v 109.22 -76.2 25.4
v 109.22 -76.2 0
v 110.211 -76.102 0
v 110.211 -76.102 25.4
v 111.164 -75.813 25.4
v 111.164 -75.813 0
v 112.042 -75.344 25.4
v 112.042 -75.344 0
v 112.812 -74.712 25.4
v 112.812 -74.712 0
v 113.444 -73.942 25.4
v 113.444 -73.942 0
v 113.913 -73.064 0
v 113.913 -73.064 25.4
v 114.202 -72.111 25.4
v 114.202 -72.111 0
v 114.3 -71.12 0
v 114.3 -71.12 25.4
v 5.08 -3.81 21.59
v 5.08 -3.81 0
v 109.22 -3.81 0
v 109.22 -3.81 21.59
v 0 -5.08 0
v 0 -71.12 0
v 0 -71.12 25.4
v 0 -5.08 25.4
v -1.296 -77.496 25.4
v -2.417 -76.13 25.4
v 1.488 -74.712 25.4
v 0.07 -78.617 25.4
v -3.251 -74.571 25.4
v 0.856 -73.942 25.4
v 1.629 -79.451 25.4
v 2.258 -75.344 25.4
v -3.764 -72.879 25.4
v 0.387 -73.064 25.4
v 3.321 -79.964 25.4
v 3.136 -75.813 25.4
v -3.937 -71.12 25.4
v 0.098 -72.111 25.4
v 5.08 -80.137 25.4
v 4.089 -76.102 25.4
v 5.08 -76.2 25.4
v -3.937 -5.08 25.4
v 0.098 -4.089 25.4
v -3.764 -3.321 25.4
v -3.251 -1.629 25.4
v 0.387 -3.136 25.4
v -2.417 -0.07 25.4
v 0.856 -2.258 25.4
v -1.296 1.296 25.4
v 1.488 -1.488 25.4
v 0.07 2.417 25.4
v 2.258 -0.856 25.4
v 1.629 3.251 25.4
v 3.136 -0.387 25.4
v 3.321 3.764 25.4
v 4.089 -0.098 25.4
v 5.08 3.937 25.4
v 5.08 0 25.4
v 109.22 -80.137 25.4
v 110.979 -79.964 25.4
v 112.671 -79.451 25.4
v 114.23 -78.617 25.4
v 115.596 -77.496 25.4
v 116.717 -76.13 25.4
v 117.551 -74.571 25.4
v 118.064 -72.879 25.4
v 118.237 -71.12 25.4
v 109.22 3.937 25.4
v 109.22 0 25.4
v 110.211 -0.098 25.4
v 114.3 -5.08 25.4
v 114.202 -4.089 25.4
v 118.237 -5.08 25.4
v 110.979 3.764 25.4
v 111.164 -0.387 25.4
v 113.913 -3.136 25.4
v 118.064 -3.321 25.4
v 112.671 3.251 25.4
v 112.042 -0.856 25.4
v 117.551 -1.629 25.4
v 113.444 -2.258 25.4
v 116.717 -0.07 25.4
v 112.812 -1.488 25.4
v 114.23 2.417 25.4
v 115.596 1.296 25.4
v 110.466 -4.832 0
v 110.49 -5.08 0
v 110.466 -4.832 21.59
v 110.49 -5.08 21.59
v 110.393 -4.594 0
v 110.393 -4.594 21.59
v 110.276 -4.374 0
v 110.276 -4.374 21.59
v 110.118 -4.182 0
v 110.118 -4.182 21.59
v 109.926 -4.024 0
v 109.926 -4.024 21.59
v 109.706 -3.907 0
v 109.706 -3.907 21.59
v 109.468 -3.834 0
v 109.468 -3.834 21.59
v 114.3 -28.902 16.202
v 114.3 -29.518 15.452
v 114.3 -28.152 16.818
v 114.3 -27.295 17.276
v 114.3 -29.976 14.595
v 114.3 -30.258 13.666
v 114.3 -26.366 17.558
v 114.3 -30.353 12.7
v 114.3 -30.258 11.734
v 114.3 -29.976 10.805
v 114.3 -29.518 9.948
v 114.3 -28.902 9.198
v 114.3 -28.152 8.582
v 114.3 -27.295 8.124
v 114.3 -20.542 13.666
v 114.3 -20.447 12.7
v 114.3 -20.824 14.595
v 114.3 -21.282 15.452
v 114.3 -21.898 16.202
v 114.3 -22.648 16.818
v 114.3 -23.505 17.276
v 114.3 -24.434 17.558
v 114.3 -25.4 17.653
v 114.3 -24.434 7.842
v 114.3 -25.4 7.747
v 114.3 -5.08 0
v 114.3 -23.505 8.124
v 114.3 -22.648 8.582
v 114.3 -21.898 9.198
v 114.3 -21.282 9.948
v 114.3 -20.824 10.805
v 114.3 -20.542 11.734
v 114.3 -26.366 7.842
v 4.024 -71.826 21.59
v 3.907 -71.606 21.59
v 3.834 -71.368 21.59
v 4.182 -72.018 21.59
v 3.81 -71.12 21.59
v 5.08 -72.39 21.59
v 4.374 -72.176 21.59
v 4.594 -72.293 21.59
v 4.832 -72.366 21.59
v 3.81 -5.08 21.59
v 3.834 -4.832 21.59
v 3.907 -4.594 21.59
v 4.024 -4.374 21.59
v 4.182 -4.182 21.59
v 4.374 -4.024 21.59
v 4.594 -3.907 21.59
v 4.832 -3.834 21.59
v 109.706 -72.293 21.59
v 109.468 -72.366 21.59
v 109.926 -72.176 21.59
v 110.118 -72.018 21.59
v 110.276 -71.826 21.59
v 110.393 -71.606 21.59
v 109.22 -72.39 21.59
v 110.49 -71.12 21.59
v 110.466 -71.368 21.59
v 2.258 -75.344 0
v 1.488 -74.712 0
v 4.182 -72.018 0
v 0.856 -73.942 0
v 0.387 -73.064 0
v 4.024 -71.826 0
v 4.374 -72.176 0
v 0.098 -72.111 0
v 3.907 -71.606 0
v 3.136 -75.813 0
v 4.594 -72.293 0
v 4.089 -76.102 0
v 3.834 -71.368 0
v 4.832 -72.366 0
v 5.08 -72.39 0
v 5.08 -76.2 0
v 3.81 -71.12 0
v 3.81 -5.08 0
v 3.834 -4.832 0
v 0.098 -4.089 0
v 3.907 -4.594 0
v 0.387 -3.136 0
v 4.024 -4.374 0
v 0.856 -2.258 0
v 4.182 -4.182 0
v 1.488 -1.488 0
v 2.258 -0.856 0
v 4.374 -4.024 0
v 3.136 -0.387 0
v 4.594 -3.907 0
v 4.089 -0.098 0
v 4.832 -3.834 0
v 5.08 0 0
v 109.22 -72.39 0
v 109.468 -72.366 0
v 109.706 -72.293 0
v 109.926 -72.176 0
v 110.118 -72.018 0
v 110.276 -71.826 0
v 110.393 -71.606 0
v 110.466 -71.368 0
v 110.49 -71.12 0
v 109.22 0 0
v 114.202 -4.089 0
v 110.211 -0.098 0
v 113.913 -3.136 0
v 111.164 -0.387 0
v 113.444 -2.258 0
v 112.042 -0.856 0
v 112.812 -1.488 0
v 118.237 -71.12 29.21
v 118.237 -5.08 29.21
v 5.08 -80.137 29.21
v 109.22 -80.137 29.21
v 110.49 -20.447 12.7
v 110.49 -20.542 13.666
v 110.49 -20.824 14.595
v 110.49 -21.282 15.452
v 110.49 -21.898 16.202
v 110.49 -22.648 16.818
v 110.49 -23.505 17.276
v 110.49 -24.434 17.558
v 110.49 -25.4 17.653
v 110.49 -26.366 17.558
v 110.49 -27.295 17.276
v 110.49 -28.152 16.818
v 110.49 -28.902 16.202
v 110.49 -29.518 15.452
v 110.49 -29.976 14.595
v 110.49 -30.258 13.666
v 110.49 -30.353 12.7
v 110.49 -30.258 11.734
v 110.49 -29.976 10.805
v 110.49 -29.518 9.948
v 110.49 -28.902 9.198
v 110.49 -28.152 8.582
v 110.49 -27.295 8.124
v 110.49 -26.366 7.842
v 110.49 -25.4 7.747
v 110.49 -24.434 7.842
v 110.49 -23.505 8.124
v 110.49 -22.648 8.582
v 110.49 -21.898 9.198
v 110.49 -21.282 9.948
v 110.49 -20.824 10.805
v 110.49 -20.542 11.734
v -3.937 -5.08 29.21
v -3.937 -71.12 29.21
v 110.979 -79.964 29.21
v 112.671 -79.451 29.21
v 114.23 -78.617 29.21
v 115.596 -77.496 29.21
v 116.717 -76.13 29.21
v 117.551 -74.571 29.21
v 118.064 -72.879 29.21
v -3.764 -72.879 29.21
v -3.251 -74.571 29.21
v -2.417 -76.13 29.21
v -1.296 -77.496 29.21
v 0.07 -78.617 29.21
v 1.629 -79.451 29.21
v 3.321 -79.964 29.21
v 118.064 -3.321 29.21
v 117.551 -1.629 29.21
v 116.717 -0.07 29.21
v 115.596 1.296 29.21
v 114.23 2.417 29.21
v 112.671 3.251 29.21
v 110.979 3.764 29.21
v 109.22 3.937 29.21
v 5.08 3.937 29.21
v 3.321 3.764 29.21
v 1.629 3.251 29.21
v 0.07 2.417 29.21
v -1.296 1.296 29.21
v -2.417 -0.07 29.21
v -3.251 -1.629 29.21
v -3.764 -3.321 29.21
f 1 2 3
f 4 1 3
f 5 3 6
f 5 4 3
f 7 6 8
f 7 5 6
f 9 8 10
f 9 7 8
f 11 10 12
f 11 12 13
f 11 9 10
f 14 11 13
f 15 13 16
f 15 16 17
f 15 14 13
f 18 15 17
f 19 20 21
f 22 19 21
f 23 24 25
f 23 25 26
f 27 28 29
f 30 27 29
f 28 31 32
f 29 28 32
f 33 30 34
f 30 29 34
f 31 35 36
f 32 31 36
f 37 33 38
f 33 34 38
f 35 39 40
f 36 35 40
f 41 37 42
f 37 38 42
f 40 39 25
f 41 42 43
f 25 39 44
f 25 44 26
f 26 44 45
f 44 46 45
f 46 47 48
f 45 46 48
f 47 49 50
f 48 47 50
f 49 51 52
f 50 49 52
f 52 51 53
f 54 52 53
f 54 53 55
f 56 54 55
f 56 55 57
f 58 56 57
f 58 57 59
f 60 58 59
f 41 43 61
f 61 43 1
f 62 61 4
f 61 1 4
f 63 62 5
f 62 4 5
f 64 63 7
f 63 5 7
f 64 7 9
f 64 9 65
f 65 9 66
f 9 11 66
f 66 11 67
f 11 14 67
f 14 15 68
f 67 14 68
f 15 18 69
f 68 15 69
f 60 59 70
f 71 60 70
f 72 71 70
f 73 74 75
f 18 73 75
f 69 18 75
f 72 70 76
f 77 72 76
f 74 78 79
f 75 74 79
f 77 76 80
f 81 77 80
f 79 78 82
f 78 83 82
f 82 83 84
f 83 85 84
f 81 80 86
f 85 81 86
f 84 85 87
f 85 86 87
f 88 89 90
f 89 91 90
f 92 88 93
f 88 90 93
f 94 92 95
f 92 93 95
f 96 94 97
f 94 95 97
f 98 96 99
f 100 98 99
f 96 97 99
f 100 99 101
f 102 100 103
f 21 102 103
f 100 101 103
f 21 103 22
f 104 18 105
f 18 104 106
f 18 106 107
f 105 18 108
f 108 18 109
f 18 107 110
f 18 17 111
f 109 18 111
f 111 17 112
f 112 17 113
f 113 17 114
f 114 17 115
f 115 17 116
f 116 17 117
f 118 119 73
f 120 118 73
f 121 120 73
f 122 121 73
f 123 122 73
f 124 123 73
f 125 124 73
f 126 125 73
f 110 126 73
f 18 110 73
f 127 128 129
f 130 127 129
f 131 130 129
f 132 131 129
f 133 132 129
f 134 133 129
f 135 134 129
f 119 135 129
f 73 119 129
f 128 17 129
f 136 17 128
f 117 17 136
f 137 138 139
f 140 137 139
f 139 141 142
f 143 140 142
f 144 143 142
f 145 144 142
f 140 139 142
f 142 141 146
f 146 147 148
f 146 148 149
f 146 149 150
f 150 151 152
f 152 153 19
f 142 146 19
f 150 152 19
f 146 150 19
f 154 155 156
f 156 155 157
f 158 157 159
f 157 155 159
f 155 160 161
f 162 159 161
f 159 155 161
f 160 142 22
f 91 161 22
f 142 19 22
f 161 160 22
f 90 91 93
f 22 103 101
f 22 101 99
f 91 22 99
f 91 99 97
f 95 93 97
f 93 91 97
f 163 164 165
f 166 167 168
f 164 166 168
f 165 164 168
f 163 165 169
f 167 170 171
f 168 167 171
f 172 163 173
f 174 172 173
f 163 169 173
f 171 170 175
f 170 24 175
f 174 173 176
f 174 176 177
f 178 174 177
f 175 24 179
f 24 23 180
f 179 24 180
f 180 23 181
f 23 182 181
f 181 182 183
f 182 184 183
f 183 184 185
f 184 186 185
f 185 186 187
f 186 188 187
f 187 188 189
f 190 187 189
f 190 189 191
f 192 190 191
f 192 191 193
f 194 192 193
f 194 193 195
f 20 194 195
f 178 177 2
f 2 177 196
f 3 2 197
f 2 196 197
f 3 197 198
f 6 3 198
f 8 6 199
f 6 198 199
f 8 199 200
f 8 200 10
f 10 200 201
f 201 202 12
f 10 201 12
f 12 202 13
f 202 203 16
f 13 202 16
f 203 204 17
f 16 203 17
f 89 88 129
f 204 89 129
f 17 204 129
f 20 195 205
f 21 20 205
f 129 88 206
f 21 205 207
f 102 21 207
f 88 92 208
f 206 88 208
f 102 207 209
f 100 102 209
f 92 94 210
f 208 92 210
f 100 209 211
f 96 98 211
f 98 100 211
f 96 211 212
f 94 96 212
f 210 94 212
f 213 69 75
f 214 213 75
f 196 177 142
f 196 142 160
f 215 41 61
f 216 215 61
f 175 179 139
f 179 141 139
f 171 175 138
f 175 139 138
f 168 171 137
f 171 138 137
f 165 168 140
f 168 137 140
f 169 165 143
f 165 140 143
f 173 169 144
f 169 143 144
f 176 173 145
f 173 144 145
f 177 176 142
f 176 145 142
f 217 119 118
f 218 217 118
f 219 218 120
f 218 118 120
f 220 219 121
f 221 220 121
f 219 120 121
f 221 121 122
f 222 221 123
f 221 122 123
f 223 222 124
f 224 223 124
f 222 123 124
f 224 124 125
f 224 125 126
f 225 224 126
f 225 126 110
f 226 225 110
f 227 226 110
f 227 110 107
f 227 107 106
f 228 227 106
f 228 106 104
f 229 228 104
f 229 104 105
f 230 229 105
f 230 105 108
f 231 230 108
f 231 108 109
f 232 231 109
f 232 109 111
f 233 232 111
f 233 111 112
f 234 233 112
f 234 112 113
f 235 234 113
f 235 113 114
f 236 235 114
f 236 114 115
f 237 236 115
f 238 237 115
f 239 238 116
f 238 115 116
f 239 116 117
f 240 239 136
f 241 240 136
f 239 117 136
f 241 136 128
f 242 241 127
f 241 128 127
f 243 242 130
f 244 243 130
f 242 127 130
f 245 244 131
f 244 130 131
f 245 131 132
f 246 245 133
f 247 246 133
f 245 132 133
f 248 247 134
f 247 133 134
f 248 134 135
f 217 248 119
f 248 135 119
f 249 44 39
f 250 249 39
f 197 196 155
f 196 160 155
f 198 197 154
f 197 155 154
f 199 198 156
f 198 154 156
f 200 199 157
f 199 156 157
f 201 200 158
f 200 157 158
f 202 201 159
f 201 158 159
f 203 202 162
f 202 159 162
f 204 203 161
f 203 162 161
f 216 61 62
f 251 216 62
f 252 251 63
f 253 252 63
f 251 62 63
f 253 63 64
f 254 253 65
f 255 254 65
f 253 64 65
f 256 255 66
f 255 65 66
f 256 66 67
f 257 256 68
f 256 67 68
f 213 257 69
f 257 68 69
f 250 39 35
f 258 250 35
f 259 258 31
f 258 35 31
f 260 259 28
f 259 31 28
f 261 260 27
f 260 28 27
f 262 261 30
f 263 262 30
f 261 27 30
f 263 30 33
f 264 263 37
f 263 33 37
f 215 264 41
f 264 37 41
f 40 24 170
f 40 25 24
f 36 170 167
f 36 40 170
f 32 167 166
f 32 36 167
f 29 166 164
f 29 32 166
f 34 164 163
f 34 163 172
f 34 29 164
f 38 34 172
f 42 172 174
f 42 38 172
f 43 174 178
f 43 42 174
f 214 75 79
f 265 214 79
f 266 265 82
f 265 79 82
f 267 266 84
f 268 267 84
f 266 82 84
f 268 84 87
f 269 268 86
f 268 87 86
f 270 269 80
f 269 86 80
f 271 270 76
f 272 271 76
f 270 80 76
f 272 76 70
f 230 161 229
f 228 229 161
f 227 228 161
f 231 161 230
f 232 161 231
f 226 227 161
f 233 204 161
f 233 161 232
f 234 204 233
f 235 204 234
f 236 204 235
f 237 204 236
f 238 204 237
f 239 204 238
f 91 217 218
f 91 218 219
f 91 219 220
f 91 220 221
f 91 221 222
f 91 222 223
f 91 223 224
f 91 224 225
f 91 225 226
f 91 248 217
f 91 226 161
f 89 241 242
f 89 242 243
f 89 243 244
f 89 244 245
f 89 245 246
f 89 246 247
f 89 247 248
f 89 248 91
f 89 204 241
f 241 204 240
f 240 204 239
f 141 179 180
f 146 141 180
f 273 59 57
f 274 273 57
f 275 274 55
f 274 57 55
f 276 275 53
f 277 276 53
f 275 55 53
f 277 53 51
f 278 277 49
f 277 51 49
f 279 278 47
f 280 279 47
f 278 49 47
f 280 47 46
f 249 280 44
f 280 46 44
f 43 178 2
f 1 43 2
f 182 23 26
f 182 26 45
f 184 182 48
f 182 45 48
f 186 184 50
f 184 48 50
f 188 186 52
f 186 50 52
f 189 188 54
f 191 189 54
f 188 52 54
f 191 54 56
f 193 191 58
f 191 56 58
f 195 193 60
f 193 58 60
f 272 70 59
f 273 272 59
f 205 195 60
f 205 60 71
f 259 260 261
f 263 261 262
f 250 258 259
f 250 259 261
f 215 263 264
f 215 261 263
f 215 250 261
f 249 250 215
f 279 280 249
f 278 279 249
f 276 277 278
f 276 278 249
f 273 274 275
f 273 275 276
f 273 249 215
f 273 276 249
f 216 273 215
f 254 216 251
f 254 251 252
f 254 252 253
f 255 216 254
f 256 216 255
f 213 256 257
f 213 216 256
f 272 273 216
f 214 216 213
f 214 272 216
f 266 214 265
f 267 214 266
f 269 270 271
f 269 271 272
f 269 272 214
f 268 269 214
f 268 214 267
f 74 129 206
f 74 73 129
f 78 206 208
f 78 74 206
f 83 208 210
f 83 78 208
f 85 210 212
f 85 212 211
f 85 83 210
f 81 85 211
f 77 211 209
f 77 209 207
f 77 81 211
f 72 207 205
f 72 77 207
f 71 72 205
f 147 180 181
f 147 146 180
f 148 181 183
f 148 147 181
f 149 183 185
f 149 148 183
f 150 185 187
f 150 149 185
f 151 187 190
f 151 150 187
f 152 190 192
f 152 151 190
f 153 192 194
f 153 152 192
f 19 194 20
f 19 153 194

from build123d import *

# Parameters (mm, degrees)
F0_W     = 114.3
F0_H     = 76.2
F1_DEPTH = 25.4
F2_R     = 5.08
F3_T     = -3.81
F4_R     = 4.953
F5_DEPTH = 25.4
F7_DEPTH = 3.81


with BuildPart() as f1:
    # F0 (on Top) → F1 (new body)
    with BuildSketch(Plane.XY):
        with Locations((57.15, -38.1)):
            Rectangle(F0_W, F0_H)
    extrude(amount=F1_DEPTH)

    # F2
    f2_edges = [f1.edges().sort_by_distance(p)[0] for p in [
        (114.3, 0, 12.7),
        (114.3, -76.2, 12.7),
        (0, 0, 12.7),
        (0, -76.2, 12.7),
    ]]
    fillet(f2_edges, radius=F2_R)

    # F3
    f3_openings = [f1.faces().sort_by_distance(p)[0] for p in [
        (57.15, -38.1, 0),
    ]]
    offset(amount=F3_T, openings=f3_openings)

    # F4 (on face) → F5 (cut)
    with BuildSketch(Plane.YZ.offset(114.3)):
        with Locations((-25.4, 12.7)):
            Circle(F4_R)
    extrude(amount=-F5_DEPTH, mode=Mode.SUBTRACT)

    # F6 (on face) → F7 (join)
    with BuildSketch(Plane.XY.offset(25.4)):
        with BuildLine():
            Line((109.22, 3.937), (5.08, 3.937))
            ThreePointArc((5.08, 3.937), (-1.295982, 1.295982), (-3.937, -5.08))
            Line((-3.937, -5.08), (-3.937, -71.12))
            ThreePointArc((-3.937, -71.12), (-1.295982, -77.495982), (5.08, -80.137))
            Line((5.08, -80.137), (109.22, -80.137))
            ThreePointArc((109.22, -80.137), (115.595982, -77.495982), (118.237, -71.12))
            Line((118.237, -71.12), (118.237, -5.08))
            ThreePointArc((118.237, -5.08), (115.595982, 1.295982), (109.22, 3.937))
        make_face()
        with BuildLine():
            ThreePointArc((-0.127, -5.08), (1.398095, -1.398095), (5.08, 0.127))
            Line((5.08, 0.127), (109.22, 0.127))
            ThreePointArc((109.22, 0.127), (112.901905, -1.398095), (114.427, -5.08))
            Line((114.427, -5.08), (114.427, -71.12))
            ThreePointArc((114.427, -71.12), (112.901905, -74.801905), (109.22, -76.327))
            Line((109.22, -76.327), (5.08, -76.327))
            ThreePointArc((5.08, -76.327), (1.398095, -74.801905), (-0.127, -71.12))
            Line((-0.127, -71.12), (-0.127, -5.08))
        make_face(mode=Mode.SUBTRACT)
        with BuildLine():
            Line((109.22, 0.127), (5.08, 0.127))
            ThreePointArc((5.08, 0.127), (1.398095, -1.398095), (-0.127, -5.08))
            Line((-0.127, -5.08), (-0.127, -71.12))
            ThreePointArc((-0.127, -71.12), (1.398095, -74.801905), (5.08, -76.327))
            Line((5.08, -76.327), (109.22, -76.327))
            ThreePointArc((109.22, -76.327), (112.901905, -74.801905), (114.427, -71.12))
            Line((114.427, -71.12), (114.427, -5.08))
            ThreePointArc((114.427, -5.08), (112.901905, -1.398095), (109.22, 0.127))
        make_face()
        with BuildLine():
            ThreePointArc((5.08, -76.2), (1.487898, -74.712102), (0, -71.12))
            Line((0, -71.12), (0, -5.08))
            ThreePointArc((0, -5.08), (1.487898, -1.487898), (5.08, 0))
            Line((5.08, 0), (109.22, 0))
            ThreePointArc((109.22, 0), (112.812102, -1.487898), (114.3, -5.08))
            Line((114.3, -5.08), (114.3, -71.12))
            ThreePointArc((114.3, -71.12), (112.812102, -74.712102), (109.22, -76.2))
            Line((109.22, -76.2), (5.08, -76.2))
        make_face(mode=Mode.SUBTRACT)
        with BuildLine():
            Line((0, -5.08), (0, -71.12))
            ThreePointArc((0, -71.12), (1.487898, -74.712102), (5.08, -76.2))
            Line((5.08, -76.2), (109.22, -76.2))
            ThreePointArc((109.22, -76.2), (112.812102, -74.712102), (114.3, -71.12))
            Line((114.3, -71.12), (114.3, -5.08))
            ThreePointArc((114.3, -5.08), (112.812102, -1.487898), (109.22, 0))
            Line((109.22, 0), (5.08, 0))
            ThreePointArc((5.08, 0), (1.487898, -1.487898), (0, -5.08))
        make_face()
    extrude(amount=F7_DEPTH)


solid = f1.part
